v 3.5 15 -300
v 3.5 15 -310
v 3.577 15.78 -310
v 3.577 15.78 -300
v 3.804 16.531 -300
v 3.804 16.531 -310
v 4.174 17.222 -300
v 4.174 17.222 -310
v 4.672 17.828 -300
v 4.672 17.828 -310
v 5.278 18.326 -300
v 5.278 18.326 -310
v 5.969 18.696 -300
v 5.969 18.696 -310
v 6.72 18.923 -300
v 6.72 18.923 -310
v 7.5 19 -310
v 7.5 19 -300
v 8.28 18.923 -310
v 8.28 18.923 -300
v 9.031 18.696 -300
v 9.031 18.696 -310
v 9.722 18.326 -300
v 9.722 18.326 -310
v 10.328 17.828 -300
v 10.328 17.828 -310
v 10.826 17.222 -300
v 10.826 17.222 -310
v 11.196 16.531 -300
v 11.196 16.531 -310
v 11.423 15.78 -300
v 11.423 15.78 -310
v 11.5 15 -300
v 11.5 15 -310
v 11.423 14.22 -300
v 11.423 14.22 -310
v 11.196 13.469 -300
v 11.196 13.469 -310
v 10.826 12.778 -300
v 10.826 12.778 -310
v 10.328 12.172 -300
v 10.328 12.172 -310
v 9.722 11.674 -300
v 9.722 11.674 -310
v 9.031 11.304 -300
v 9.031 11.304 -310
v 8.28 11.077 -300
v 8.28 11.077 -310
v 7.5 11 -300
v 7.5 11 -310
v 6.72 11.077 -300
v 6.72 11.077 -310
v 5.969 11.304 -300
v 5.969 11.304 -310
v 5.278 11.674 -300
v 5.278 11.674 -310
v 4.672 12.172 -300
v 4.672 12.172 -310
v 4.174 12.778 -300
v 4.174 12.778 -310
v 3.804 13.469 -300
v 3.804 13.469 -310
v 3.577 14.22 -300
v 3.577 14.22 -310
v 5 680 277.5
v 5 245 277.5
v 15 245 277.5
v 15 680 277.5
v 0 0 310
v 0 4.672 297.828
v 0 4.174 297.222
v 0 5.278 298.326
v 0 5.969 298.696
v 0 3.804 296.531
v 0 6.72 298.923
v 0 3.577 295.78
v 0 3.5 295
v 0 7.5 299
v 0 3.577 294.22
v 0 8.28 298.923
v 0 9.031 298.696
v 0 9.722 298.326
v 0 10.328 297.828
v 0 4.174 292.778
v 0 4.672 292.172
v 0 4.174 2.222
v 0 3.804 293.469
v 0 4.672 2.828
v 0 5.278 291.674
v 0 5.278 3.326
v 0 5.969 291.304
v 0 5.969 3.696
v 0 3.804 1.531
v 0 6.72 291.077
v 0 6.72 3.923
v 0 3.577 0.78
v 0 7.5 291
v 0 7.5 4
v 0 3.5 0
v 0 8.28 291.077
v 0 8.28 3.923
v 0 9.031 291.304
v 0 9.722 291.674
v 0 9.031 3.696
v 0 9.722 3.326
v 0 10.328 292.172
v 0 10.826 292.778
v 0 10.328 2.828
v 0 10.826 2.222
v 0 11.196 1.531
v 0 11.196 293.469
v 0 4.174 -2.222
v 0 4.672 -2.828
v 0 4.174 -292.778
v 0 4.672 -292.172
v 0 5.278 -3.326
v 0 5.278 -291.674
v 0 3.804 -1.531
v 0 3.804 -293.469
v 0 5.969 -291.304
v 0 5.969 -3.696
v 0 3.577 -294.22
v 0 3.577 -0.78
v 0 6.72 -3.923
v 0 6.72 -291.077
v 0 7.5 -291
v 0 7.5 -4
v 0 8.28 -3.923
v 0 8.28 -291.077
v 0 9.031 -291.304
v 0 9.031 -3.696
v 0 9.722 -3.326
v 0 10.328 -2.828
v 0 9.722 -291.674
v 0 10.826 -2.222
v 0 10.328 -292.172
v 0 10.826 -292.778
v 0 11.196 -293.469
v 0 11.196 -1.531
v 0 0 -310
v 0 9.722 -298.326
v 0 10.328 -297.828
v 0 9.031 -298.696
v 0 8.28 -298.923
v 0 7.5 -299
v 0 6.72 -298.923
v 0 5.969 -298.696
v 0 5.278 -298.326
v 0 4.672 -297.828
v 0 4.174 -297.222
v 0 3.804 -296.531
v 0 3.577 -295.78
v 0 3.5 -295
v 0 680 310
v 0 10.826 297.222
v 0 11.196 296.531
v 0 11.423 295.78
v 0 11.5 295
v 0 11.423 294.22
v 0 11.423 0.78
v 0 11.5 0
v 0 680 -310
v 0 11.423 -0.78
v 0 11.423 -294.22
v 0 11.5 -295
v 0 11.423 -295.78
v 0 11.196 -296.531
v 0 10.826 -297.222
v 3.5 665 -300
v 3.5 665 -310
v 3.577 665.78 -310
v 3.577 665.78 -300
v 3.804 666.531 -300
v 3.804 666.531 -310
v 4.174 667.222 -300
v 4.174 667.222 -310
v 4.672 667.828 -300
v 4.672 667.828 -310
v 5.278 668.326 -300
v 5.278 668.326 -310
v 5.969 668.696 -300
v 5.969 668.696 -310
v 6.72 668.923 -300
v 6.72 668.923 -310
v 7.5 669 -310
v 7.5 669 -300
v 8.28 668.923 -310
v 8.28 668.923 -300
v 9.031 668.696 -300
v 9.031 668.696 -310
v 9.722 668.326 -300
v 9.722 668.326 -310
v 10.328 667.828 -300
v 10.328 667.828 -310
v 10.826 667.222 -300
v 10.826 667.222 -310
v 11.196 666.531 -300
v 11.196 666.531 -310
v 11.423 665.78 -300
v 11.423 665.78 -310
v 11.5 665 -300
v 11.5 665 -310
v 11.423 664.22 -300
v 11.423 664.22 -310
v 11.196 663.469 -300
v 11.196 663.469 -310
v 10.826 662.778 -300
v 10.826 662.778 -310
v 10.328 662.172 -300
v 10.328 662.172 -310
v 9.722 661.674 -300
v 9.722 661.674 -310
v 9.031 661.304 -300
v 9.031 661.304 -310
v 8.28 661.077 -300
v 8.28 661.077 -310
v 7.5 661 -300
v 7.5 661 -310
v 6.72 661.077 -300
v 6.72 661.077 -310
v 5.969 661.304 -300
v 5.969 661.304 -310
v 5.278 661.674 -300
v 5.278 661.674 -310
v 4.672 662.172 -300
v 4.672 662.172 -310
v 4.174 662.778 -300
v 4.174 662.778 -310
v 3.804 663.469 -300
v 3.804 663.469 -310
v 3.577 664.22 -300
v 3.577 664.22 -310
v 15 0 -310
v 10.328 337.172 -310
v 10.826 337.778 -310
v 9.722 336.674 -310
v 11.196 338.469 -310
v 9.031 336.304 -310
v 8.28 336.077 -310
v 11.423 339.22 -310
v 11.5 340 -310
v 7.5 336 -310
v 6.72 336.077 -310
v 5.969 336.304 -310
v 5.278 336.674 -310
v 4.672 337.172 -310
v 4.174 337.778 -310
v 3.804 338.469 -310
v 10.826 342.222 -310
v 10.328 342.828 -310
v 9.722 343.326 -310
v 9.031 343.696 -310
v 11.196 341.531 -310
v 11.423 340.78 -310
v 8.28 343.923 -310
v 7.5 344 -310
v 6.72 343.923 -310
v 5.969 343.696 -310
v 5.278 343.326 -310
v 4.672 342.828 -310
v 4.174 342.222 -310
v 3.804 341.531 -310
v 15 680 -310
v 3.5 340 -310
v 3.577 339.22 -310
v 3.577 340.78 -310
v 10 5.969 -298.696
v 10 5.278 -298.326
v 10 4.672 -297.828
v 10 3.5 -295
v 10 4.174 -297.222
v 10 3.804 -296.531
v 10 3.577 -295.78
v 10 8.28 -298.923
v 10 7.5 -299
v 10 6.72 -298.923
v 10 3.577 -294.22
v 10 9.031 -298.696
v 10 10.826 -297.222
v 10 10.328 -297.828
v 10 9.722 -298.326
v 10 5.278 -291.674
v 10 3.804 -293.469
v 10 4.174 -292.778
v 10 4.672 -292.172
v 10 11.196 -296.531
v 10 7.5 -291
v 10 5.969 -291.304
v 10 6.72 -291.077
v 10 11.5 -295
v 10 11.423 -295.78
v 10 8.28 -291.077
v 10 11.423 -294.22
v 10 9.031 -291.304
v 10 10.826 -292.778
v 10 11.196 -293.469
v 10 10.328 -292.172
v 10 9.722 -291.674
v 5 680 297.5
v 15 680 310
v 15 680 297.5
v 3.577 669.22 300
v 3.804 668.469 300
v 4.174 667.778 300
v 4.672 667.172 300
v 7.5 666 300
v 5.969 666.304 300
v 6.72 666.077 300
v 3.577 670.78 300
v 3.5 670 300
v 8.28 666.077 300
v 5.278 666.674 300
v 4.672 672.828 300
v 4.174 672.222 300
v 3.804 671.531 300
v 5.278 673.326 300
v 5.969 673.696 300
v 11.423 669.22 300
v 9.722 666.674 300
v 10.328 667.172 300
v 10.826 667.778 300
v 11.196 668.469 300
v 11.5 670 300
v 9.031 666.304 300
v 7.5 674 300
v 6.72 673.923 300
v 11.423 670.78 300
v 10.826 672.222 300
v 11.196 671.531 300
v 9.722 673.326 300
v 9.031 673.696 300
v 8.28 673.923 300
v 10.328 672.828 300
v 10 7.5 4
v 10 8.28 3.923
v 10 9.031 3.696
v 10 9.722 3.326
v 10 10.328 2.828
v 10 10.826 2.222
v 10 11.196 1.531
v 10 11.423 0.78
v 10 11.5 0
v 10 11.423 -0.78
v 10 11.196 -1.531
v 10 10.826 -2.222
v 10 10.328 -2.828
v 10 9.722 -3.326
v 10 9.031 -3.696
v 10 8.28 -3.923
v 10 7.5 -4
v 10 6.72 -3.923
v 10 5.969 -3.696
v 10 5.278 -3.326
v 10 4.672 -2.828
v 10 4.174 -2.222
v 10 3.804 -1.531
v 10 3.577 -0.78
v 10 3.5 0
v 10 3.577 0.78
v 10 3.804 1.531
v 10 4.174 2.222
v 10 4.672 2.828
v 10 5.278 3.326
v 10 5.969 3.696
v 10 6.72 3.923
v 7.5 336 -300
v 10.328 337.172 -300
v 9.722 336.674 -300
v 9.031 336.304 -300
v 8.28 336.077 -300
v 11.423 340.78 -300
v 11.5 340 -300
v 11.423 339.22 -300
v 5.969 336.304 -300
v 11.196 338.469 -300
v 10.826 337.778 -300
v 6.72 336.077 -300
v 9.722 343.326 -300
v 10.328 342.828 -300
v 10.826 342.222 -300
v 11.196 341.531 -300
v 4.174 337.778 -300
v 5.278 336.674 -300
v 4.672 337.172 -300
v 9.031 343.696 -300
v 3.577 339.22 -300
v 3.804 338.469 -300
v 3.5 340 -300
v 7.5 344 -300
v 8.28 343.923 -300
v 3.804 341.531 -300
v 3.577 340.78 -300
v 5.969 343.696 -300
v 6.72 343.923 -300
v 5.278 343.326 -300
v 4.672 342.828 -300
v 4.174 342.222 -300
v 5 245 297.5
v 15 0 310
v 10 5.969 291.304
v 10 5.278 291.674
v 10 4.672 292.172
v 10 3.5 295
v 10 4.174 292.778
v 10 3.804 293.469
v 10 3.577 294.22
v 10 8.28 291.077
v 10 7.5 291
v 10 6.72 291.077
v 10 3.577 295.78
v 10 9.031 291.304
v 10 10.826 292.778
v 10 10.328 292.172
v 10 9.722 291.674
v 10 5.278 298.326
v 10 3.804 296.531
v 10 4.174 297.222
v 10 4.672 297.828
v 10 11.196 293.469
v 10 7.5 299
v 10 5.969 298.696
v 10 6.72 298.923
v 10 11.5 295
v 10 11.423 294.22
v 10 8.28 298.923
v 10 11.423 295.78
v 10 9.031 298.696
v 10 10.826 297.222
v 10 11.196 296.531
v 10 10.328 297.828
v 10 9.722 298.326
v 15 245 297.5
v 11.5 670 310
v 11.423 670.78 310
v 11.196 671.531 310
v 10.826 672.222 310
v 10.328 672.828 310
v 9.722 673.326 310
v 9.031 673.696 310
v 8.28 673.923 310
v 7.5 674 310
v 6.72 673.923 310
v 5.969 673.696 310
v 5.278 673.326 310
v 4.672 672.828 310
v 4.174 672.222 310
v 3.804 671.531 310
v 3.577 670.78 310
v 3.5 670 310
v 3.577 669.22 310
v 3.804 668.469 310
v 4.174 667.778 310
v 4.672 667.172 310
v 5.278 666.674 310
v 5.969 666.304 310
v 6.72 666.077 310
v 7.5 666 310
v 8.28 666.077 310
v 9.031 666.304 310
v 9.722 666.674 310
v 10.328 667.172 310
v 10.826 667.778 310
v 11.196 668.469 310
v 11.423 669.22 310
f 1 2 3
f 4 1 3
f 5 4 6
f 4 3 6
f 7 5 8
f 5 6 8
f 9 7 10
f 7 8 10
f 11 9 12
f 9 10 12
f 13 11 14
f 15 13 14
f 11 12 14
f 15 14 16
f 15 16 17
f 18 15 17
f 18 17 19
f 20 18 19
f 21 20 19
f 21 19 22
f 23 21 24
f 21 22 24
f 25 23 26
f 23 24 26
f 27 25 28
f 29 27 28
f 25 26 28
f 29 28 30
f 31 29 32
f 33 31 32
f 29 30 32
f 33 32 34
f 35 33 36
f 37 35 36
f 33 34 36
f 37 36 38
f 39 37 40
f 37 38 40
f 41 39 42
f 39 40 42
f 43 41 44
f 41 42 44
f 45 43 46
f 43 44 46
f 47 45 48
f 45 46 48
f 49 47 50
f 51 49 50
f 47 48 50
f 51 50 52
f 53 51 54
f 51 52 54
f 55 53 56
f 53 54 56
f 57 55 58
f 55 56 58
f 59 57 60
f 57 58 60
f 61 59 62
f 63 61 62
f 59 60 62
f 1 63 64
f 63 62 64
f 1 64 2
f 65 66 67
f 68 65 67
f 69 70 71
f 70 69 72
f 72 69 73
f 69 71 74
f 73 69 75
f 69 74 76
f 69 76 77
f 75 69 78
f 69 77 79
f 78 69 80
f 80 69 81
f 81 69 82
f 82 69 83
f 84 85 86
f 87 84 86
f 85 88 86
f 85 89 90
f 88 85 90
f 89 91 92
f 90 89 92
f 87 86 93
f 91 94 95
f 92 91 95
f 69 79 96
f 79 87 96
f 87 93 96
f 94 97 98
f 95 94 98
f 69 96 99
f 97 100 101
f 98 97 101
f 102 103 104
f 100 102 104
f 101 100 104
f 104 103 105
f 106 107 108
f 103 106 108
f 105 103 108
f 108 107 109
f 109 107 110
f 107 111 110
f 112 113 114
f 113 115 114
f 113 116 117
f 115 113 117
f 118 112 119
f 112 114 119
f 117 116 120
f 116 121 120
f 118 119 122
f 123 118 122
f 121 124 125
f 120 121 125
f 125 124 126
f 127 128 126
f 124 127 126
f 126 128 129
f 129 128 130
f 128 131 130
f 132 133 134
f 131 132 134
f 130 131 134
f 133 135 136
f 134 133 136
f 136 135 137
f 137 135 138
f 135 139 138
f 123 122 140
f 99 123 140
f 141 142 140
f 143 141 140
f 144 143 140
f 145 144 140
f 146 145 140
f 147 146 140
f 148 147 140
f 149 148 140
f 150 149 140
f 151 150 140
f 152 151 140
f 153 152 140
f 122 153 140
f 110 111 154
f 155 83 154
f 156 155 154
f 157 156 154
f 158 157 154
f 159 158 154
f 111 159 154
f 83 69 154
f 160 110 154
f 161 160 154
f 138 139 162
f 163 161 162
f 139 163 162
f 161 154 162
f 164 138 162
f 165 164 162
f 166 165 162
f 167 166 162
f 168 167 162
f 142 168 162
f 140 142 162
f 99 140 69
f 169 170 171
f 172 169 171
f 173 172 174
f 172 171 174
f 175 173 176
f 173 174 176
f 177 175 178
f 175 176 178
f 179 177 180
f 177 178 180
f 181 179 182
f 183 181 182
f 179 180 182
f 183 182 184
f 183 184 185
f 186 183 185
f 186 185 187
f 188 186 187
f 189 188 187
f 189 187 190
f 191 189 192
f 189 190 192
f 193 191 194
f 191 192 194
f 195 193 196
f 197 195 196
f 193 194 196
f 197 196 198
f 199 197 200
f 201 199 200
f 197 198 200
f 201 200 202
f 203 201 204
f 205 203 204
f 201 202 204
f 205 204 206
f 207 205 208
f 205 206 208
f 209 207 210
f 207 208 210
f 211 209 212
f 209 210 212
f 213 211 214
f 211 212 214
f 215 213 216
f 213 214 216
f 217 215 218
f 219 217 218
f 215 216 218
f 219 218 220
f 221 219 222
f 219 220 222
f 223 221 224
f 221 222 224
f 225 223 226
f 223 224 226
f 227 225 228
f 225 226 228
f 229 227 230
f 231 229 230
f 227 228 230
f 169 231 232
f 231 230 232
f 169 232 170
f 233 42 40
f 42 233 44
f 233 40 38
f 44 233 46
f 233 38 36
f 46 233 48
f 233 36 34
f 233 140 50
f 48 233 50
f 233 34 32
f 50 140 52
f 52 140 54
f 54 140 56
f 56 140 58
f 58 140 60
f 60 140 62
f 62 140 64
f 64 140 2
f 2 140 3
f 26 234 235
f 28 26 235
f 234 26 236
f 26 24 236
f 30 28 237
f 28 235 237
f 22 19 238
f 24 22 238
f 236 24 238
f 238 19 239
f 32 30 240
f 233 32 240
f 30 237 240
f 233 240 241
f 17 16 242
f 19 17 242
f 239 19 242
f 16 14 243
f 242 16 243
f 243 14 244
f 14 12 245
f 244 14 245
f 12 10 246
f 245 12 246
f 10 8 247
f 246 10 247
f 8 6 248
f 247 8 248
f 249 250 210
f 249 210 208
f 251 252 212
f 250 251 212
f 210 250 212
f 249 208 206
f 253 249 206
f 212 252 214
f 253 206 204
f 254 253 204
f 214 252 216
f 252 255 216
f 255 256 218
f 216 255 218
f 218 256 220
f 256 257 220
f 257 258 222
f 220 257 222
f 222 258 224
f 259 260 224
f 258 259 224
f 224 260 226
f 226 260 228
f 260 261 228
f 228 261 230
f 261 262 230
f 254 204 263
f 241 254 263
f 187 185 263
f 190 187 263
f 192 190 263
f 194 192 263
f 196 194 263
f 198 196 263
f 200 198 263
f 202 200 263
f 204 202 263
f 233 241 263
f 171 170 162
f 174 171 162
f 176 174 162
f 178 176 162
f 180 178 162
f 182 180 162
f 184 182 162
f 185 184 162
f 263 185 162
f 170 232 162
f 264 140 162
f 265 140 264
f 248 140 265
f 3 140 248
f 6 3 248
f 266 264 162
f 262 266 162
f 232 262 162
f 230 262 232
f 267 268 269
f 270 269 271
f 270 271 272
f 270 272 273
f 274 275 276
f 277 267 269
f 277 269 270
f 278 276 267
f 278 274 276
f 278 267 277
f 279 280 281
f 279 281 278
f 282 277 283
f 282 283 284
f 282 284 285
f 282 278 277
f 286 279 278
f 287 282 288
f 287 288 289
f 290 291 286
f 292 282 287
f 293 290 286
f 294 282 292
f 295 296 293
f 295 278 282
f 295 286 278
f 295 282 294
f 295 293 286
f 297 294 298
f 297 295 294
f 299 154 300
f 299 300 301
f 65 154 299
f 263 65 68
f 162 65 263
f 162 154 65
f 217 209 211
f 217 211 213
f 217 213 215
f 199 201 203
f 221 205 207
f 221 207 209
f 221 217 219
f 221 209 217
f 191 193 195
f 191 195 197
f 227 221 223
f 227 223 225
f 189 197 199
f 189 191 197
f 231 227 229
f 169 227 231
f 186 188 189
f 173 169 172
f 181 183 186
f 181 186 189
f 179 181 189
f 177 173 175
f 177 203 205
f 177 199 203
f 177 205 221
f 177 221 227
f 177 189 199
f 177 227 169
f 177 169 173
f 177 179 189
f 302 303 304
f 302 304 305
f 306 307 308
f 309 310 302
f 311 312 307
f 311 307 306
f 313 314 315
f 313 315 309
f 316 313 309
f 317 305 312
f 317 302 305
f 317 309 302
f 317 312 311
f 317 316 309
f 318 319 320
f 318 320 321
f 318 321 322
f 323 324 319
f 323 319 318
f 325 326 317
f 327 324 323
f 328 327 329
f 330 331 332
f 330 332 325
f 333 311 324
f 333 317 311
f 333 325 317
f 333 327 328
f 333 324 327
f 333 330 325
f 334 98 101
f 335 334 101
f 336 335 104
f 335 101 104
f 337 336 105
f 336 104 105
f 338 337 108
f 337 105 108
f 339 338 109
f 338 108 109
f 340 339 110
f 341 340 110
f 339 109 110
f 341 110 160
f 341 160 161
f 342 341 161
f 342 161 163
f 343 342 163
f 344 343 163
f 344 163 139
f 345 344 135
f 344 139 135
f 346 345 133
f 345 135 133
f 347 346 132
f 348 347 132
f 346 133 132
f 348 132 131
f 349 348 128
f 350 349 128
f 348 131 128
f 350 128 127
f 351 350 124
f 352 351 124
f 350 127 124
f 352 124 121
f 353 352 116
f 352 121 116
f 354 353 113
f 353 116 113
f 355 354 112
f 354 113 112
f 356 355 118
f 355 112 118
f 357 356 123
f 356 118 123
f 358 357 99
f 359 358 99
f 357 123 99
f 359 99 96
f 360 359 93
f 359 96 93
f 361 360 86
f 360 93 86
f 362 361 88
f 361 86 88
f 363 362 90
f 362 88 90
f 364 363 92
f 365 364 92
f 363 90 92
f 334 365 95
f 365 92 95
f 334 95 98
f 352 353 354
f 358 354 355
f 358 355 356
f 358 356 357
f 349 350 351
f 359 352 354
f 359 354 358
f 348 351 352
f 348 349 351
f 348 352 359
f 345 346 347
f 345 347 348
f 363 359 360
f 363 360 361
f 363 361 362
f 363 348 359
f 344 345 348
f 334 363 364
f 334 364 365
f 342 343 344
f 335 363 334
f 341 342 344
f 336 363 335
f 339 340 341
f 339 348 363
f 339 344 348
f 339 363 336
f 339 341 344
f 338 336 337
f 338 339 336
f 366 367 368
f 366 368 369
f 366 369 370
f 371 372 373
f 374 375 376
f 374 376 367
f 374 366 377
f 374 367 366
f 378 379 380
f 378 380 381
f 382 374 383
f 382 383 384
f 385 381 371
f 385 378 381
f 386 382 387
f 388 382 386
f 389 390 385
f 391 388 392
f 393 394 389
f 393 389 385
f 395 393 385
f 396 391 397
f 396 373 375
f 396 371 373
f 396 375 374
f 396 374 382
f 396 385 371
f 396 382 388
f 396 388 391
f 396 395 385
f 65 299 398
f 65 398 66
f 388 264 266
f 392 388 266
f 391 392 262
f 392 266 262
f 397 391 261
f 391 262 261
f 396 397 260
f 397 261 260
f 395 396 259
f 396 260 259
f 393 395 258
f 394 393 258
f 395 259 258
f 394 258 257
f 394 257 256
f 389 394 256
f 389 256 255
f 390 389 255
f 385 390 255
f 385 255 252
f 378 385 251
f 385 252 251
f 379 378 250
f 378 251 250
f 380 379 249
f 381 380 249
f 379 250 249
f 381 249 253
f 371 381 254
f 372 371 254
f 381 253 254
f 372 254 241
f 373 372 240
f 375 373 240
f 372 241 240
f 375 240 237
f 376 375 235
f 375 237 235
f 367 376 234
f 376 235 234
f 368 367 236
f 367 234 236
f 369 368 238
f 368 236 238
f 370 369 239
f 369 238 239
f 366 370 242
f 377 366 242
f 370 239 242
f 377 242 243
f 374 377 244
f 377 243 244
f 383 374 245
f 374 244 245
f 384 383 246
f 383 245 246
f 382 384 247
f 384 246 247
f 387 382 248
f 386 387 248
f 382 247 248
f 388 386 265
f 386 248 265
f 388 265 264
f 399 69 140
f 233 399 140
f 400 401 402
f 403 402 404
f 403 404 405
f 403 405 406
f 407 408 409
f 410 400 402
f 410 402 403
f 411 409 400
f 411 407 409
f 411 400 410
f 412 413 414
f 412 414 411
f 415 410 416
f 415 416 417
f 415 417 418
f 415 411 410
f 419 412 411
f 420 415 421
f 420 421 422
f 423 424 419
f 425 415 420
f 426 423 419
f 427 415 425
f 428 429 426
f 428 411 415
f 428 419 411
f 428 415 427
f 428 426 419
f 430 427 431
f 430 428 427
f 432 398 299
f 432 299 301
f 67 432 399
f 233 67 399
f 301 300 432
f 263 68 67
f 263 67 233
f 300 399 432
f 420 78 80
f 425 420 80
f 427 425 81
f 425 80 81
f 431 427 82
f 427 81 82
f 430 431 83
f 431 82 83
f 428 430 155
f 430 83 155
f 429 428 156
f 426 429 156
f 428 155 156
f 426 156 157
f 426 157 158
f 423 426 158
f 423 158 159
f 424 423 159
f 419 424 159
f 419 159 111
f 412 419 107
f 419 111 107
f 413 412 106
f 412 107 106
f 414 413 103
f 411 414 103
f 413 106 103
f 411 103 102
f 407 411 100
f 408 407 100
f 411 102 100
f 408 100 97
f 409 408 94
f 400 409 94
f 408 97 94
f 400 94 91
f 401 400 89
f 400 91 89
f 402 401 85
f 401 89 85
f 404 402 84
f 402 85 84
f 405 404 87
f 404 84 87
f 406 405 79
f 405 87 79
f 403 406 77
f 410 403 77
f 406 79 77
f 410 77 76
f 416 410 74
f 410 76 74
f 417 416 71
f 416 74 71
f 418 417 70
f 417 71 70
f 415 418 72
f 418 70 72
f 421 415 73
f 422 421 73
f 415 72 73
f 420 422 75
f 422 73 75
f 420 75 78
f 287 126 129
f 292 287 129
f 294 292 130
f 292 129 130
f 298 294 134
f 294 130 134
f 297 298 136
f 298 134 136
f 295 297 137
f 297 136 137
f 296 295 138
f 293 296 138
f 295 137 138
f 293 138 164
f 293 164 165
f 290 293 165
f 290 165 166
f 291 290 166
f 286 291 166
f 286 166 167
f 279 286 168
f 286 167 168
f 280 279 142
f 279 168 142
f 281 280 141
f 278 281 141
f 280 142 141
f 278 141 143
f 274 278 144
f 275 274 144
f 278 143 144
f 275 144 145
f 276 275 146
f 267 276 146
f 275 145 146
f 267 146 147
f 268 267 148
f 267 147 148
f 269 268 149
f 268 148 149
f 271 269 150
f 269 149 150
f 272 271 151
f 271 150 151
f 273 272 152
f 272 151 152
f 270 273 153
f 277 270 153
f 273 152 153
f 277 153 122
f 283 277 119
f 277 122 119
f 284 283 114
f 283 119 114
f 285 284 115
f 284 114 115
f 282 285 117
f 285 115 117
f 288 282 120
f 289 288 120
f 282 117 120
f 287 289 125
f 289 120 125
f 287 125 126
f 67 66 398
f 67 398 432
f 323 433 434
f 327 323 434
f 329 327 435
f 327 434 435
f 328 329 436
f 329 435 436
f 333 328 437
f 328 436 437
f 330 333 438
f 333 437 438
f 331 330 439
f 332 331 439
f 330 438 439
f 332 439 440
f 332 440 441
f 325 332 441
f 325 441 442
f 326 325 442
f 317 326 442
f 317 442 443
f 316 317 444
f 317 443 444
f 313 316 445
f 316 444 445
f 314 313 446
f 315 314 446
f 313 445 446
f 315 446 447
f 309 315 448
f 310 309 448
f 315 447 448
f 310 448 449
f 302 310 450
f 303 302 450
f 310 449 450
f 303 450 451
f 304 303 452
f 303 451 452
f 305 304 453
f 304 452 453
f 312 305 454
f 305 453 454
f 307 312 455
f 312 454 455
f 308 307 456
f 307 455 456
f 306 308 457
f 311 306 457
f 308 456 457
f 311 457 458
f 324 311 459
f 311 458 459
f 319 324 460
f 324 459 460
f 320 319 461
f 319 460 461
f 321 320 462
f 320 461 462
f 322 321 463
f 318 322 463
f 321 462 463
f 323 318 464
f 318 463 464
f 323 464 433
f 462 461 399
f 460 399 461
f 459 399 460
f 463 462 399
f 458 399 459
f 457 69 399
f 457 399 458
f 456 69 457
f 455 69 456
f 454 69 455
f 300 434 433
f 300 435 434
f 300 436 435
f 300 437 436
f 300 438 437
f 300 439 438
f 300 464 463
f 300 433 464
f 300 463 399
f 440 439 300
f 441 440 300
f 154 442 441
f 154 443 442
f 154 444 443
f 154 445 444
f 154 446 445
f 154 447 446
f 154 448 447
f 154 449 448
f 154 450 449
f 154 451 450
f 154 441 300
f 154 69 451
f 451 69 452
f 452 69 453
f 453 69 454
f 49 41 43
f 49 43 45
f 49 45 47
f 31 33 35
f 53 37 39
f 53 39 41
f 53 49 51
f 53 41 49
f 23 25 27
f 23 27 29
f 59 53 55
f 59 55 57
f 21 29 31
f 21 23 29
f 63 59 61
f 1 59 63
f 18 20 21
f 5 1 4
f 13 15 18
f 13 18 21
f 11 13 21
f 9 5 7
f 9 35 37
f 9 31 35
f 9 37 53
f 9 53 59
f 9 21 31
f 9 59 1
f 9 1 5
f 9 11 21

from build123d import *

# Parameters (mm, degrees)
SKETCH1_W           = 620
SKETCH1_H           = 680
BOSS_EXTRUDE1_DEPTH = 15
SKETCH2_R           = 4
CUT_EXTRUDE1_DEPTH  = 10
LPATTERN1_COUNT     = 3
LPATTERN1_PITCH     = 295
SKETCH3_R           = 4
CUT_EXTRUDE2_DEPTH  = 10
LPATTERN2_COUNT     = 3
LPATTERN2_PITCH     = 325
SKETCH7_R           = 4
CUT_EXTRUDE7_DEPTH  = 10
SKETCH8_W           = 10
SKETCH8_H           = 20
CUT_EXTRUDE8_DEPTH  = 435


with BuildPart() as part:
    # Sketch1 → Boss-Extrude1 (new body)
    with BuildSketch(Plane(origin=(0, 0, 0), x_dir=(0, 0, -1), z_dir=(1, 0, 0))):
        with Locations((0, 340)):
            Rectangle(SKETCH1_W, SKETCH1_H)
    extrude(amount=BOSS_EXTRUDE1_DEPTH)

    # Sketch2 → Cut-Extrude1 (cut)
    with BuildSketch(Plane.ZY):
        with Locations((295, 7.5)):
            Circle(SKETCH2_R)
    cut_extrude1 = extrude(amount=-CUT_EXTRUDE1_DEPTH, mode=Mode.SUBTRACT)

    # LPattern1: Cut-Extrude1 ×3
    with Locations(*[(0, 0, -i * LPATTERN1_PITCH) for i in range(1, LPATTERN1_COUNT)]):
        add(cut_extrude1, mode=Mode.SUBTRACT)

    # Sketch3 → Cut-Extrude2 (cut)
    with BuildSketch(Plane(origin=(0, 0, -310), x_dir=(-1, 0, 0), z_dir=(0, 0, -1))):
        with Locations((-7.5, 15)):
            Circle(SKETCH3_R)
    cut_extrude2 = extrude(amount=-CUT_EXTRUDE2_DEPTH, mode=Mode.SUBTRACT)

    # LPattern2: Cut-Extrude2 ×3
    with Locations(*[(0, i * LPATTERN2_PITCH, 0) for i in range(1, LPATTERN2_COUNT)]):
        add(cut_extrude2, mode=Mode.SUBTRACT)

    # Sketch7 → Cut-Extrude7 (cut)
    with BuildSketch(Plane.XY.offset(310)):
        with Locations((7.5, 670)):
            Circle(SKETCH7_R)
    extrude(amount=-CUT_EXTRUDE7_DEPTH, mode=Mode.SUBTRACT)

    # Sketch8 → Cut-Extrude8 (cut)
    with BuildSketch(Plane(origin=(0, 680, 0), x_dir=(1, 0, 0), z_dir=(0, 1, 0))):
        with Locations((10, -287.5)):
            Rectangle(SKETCH8_W, SKETCH8_H)
    extrude(amount=-CUT_EXTRUDE8_DEPTH, mode=Mode.SUBTRACT)


solid = part.part
